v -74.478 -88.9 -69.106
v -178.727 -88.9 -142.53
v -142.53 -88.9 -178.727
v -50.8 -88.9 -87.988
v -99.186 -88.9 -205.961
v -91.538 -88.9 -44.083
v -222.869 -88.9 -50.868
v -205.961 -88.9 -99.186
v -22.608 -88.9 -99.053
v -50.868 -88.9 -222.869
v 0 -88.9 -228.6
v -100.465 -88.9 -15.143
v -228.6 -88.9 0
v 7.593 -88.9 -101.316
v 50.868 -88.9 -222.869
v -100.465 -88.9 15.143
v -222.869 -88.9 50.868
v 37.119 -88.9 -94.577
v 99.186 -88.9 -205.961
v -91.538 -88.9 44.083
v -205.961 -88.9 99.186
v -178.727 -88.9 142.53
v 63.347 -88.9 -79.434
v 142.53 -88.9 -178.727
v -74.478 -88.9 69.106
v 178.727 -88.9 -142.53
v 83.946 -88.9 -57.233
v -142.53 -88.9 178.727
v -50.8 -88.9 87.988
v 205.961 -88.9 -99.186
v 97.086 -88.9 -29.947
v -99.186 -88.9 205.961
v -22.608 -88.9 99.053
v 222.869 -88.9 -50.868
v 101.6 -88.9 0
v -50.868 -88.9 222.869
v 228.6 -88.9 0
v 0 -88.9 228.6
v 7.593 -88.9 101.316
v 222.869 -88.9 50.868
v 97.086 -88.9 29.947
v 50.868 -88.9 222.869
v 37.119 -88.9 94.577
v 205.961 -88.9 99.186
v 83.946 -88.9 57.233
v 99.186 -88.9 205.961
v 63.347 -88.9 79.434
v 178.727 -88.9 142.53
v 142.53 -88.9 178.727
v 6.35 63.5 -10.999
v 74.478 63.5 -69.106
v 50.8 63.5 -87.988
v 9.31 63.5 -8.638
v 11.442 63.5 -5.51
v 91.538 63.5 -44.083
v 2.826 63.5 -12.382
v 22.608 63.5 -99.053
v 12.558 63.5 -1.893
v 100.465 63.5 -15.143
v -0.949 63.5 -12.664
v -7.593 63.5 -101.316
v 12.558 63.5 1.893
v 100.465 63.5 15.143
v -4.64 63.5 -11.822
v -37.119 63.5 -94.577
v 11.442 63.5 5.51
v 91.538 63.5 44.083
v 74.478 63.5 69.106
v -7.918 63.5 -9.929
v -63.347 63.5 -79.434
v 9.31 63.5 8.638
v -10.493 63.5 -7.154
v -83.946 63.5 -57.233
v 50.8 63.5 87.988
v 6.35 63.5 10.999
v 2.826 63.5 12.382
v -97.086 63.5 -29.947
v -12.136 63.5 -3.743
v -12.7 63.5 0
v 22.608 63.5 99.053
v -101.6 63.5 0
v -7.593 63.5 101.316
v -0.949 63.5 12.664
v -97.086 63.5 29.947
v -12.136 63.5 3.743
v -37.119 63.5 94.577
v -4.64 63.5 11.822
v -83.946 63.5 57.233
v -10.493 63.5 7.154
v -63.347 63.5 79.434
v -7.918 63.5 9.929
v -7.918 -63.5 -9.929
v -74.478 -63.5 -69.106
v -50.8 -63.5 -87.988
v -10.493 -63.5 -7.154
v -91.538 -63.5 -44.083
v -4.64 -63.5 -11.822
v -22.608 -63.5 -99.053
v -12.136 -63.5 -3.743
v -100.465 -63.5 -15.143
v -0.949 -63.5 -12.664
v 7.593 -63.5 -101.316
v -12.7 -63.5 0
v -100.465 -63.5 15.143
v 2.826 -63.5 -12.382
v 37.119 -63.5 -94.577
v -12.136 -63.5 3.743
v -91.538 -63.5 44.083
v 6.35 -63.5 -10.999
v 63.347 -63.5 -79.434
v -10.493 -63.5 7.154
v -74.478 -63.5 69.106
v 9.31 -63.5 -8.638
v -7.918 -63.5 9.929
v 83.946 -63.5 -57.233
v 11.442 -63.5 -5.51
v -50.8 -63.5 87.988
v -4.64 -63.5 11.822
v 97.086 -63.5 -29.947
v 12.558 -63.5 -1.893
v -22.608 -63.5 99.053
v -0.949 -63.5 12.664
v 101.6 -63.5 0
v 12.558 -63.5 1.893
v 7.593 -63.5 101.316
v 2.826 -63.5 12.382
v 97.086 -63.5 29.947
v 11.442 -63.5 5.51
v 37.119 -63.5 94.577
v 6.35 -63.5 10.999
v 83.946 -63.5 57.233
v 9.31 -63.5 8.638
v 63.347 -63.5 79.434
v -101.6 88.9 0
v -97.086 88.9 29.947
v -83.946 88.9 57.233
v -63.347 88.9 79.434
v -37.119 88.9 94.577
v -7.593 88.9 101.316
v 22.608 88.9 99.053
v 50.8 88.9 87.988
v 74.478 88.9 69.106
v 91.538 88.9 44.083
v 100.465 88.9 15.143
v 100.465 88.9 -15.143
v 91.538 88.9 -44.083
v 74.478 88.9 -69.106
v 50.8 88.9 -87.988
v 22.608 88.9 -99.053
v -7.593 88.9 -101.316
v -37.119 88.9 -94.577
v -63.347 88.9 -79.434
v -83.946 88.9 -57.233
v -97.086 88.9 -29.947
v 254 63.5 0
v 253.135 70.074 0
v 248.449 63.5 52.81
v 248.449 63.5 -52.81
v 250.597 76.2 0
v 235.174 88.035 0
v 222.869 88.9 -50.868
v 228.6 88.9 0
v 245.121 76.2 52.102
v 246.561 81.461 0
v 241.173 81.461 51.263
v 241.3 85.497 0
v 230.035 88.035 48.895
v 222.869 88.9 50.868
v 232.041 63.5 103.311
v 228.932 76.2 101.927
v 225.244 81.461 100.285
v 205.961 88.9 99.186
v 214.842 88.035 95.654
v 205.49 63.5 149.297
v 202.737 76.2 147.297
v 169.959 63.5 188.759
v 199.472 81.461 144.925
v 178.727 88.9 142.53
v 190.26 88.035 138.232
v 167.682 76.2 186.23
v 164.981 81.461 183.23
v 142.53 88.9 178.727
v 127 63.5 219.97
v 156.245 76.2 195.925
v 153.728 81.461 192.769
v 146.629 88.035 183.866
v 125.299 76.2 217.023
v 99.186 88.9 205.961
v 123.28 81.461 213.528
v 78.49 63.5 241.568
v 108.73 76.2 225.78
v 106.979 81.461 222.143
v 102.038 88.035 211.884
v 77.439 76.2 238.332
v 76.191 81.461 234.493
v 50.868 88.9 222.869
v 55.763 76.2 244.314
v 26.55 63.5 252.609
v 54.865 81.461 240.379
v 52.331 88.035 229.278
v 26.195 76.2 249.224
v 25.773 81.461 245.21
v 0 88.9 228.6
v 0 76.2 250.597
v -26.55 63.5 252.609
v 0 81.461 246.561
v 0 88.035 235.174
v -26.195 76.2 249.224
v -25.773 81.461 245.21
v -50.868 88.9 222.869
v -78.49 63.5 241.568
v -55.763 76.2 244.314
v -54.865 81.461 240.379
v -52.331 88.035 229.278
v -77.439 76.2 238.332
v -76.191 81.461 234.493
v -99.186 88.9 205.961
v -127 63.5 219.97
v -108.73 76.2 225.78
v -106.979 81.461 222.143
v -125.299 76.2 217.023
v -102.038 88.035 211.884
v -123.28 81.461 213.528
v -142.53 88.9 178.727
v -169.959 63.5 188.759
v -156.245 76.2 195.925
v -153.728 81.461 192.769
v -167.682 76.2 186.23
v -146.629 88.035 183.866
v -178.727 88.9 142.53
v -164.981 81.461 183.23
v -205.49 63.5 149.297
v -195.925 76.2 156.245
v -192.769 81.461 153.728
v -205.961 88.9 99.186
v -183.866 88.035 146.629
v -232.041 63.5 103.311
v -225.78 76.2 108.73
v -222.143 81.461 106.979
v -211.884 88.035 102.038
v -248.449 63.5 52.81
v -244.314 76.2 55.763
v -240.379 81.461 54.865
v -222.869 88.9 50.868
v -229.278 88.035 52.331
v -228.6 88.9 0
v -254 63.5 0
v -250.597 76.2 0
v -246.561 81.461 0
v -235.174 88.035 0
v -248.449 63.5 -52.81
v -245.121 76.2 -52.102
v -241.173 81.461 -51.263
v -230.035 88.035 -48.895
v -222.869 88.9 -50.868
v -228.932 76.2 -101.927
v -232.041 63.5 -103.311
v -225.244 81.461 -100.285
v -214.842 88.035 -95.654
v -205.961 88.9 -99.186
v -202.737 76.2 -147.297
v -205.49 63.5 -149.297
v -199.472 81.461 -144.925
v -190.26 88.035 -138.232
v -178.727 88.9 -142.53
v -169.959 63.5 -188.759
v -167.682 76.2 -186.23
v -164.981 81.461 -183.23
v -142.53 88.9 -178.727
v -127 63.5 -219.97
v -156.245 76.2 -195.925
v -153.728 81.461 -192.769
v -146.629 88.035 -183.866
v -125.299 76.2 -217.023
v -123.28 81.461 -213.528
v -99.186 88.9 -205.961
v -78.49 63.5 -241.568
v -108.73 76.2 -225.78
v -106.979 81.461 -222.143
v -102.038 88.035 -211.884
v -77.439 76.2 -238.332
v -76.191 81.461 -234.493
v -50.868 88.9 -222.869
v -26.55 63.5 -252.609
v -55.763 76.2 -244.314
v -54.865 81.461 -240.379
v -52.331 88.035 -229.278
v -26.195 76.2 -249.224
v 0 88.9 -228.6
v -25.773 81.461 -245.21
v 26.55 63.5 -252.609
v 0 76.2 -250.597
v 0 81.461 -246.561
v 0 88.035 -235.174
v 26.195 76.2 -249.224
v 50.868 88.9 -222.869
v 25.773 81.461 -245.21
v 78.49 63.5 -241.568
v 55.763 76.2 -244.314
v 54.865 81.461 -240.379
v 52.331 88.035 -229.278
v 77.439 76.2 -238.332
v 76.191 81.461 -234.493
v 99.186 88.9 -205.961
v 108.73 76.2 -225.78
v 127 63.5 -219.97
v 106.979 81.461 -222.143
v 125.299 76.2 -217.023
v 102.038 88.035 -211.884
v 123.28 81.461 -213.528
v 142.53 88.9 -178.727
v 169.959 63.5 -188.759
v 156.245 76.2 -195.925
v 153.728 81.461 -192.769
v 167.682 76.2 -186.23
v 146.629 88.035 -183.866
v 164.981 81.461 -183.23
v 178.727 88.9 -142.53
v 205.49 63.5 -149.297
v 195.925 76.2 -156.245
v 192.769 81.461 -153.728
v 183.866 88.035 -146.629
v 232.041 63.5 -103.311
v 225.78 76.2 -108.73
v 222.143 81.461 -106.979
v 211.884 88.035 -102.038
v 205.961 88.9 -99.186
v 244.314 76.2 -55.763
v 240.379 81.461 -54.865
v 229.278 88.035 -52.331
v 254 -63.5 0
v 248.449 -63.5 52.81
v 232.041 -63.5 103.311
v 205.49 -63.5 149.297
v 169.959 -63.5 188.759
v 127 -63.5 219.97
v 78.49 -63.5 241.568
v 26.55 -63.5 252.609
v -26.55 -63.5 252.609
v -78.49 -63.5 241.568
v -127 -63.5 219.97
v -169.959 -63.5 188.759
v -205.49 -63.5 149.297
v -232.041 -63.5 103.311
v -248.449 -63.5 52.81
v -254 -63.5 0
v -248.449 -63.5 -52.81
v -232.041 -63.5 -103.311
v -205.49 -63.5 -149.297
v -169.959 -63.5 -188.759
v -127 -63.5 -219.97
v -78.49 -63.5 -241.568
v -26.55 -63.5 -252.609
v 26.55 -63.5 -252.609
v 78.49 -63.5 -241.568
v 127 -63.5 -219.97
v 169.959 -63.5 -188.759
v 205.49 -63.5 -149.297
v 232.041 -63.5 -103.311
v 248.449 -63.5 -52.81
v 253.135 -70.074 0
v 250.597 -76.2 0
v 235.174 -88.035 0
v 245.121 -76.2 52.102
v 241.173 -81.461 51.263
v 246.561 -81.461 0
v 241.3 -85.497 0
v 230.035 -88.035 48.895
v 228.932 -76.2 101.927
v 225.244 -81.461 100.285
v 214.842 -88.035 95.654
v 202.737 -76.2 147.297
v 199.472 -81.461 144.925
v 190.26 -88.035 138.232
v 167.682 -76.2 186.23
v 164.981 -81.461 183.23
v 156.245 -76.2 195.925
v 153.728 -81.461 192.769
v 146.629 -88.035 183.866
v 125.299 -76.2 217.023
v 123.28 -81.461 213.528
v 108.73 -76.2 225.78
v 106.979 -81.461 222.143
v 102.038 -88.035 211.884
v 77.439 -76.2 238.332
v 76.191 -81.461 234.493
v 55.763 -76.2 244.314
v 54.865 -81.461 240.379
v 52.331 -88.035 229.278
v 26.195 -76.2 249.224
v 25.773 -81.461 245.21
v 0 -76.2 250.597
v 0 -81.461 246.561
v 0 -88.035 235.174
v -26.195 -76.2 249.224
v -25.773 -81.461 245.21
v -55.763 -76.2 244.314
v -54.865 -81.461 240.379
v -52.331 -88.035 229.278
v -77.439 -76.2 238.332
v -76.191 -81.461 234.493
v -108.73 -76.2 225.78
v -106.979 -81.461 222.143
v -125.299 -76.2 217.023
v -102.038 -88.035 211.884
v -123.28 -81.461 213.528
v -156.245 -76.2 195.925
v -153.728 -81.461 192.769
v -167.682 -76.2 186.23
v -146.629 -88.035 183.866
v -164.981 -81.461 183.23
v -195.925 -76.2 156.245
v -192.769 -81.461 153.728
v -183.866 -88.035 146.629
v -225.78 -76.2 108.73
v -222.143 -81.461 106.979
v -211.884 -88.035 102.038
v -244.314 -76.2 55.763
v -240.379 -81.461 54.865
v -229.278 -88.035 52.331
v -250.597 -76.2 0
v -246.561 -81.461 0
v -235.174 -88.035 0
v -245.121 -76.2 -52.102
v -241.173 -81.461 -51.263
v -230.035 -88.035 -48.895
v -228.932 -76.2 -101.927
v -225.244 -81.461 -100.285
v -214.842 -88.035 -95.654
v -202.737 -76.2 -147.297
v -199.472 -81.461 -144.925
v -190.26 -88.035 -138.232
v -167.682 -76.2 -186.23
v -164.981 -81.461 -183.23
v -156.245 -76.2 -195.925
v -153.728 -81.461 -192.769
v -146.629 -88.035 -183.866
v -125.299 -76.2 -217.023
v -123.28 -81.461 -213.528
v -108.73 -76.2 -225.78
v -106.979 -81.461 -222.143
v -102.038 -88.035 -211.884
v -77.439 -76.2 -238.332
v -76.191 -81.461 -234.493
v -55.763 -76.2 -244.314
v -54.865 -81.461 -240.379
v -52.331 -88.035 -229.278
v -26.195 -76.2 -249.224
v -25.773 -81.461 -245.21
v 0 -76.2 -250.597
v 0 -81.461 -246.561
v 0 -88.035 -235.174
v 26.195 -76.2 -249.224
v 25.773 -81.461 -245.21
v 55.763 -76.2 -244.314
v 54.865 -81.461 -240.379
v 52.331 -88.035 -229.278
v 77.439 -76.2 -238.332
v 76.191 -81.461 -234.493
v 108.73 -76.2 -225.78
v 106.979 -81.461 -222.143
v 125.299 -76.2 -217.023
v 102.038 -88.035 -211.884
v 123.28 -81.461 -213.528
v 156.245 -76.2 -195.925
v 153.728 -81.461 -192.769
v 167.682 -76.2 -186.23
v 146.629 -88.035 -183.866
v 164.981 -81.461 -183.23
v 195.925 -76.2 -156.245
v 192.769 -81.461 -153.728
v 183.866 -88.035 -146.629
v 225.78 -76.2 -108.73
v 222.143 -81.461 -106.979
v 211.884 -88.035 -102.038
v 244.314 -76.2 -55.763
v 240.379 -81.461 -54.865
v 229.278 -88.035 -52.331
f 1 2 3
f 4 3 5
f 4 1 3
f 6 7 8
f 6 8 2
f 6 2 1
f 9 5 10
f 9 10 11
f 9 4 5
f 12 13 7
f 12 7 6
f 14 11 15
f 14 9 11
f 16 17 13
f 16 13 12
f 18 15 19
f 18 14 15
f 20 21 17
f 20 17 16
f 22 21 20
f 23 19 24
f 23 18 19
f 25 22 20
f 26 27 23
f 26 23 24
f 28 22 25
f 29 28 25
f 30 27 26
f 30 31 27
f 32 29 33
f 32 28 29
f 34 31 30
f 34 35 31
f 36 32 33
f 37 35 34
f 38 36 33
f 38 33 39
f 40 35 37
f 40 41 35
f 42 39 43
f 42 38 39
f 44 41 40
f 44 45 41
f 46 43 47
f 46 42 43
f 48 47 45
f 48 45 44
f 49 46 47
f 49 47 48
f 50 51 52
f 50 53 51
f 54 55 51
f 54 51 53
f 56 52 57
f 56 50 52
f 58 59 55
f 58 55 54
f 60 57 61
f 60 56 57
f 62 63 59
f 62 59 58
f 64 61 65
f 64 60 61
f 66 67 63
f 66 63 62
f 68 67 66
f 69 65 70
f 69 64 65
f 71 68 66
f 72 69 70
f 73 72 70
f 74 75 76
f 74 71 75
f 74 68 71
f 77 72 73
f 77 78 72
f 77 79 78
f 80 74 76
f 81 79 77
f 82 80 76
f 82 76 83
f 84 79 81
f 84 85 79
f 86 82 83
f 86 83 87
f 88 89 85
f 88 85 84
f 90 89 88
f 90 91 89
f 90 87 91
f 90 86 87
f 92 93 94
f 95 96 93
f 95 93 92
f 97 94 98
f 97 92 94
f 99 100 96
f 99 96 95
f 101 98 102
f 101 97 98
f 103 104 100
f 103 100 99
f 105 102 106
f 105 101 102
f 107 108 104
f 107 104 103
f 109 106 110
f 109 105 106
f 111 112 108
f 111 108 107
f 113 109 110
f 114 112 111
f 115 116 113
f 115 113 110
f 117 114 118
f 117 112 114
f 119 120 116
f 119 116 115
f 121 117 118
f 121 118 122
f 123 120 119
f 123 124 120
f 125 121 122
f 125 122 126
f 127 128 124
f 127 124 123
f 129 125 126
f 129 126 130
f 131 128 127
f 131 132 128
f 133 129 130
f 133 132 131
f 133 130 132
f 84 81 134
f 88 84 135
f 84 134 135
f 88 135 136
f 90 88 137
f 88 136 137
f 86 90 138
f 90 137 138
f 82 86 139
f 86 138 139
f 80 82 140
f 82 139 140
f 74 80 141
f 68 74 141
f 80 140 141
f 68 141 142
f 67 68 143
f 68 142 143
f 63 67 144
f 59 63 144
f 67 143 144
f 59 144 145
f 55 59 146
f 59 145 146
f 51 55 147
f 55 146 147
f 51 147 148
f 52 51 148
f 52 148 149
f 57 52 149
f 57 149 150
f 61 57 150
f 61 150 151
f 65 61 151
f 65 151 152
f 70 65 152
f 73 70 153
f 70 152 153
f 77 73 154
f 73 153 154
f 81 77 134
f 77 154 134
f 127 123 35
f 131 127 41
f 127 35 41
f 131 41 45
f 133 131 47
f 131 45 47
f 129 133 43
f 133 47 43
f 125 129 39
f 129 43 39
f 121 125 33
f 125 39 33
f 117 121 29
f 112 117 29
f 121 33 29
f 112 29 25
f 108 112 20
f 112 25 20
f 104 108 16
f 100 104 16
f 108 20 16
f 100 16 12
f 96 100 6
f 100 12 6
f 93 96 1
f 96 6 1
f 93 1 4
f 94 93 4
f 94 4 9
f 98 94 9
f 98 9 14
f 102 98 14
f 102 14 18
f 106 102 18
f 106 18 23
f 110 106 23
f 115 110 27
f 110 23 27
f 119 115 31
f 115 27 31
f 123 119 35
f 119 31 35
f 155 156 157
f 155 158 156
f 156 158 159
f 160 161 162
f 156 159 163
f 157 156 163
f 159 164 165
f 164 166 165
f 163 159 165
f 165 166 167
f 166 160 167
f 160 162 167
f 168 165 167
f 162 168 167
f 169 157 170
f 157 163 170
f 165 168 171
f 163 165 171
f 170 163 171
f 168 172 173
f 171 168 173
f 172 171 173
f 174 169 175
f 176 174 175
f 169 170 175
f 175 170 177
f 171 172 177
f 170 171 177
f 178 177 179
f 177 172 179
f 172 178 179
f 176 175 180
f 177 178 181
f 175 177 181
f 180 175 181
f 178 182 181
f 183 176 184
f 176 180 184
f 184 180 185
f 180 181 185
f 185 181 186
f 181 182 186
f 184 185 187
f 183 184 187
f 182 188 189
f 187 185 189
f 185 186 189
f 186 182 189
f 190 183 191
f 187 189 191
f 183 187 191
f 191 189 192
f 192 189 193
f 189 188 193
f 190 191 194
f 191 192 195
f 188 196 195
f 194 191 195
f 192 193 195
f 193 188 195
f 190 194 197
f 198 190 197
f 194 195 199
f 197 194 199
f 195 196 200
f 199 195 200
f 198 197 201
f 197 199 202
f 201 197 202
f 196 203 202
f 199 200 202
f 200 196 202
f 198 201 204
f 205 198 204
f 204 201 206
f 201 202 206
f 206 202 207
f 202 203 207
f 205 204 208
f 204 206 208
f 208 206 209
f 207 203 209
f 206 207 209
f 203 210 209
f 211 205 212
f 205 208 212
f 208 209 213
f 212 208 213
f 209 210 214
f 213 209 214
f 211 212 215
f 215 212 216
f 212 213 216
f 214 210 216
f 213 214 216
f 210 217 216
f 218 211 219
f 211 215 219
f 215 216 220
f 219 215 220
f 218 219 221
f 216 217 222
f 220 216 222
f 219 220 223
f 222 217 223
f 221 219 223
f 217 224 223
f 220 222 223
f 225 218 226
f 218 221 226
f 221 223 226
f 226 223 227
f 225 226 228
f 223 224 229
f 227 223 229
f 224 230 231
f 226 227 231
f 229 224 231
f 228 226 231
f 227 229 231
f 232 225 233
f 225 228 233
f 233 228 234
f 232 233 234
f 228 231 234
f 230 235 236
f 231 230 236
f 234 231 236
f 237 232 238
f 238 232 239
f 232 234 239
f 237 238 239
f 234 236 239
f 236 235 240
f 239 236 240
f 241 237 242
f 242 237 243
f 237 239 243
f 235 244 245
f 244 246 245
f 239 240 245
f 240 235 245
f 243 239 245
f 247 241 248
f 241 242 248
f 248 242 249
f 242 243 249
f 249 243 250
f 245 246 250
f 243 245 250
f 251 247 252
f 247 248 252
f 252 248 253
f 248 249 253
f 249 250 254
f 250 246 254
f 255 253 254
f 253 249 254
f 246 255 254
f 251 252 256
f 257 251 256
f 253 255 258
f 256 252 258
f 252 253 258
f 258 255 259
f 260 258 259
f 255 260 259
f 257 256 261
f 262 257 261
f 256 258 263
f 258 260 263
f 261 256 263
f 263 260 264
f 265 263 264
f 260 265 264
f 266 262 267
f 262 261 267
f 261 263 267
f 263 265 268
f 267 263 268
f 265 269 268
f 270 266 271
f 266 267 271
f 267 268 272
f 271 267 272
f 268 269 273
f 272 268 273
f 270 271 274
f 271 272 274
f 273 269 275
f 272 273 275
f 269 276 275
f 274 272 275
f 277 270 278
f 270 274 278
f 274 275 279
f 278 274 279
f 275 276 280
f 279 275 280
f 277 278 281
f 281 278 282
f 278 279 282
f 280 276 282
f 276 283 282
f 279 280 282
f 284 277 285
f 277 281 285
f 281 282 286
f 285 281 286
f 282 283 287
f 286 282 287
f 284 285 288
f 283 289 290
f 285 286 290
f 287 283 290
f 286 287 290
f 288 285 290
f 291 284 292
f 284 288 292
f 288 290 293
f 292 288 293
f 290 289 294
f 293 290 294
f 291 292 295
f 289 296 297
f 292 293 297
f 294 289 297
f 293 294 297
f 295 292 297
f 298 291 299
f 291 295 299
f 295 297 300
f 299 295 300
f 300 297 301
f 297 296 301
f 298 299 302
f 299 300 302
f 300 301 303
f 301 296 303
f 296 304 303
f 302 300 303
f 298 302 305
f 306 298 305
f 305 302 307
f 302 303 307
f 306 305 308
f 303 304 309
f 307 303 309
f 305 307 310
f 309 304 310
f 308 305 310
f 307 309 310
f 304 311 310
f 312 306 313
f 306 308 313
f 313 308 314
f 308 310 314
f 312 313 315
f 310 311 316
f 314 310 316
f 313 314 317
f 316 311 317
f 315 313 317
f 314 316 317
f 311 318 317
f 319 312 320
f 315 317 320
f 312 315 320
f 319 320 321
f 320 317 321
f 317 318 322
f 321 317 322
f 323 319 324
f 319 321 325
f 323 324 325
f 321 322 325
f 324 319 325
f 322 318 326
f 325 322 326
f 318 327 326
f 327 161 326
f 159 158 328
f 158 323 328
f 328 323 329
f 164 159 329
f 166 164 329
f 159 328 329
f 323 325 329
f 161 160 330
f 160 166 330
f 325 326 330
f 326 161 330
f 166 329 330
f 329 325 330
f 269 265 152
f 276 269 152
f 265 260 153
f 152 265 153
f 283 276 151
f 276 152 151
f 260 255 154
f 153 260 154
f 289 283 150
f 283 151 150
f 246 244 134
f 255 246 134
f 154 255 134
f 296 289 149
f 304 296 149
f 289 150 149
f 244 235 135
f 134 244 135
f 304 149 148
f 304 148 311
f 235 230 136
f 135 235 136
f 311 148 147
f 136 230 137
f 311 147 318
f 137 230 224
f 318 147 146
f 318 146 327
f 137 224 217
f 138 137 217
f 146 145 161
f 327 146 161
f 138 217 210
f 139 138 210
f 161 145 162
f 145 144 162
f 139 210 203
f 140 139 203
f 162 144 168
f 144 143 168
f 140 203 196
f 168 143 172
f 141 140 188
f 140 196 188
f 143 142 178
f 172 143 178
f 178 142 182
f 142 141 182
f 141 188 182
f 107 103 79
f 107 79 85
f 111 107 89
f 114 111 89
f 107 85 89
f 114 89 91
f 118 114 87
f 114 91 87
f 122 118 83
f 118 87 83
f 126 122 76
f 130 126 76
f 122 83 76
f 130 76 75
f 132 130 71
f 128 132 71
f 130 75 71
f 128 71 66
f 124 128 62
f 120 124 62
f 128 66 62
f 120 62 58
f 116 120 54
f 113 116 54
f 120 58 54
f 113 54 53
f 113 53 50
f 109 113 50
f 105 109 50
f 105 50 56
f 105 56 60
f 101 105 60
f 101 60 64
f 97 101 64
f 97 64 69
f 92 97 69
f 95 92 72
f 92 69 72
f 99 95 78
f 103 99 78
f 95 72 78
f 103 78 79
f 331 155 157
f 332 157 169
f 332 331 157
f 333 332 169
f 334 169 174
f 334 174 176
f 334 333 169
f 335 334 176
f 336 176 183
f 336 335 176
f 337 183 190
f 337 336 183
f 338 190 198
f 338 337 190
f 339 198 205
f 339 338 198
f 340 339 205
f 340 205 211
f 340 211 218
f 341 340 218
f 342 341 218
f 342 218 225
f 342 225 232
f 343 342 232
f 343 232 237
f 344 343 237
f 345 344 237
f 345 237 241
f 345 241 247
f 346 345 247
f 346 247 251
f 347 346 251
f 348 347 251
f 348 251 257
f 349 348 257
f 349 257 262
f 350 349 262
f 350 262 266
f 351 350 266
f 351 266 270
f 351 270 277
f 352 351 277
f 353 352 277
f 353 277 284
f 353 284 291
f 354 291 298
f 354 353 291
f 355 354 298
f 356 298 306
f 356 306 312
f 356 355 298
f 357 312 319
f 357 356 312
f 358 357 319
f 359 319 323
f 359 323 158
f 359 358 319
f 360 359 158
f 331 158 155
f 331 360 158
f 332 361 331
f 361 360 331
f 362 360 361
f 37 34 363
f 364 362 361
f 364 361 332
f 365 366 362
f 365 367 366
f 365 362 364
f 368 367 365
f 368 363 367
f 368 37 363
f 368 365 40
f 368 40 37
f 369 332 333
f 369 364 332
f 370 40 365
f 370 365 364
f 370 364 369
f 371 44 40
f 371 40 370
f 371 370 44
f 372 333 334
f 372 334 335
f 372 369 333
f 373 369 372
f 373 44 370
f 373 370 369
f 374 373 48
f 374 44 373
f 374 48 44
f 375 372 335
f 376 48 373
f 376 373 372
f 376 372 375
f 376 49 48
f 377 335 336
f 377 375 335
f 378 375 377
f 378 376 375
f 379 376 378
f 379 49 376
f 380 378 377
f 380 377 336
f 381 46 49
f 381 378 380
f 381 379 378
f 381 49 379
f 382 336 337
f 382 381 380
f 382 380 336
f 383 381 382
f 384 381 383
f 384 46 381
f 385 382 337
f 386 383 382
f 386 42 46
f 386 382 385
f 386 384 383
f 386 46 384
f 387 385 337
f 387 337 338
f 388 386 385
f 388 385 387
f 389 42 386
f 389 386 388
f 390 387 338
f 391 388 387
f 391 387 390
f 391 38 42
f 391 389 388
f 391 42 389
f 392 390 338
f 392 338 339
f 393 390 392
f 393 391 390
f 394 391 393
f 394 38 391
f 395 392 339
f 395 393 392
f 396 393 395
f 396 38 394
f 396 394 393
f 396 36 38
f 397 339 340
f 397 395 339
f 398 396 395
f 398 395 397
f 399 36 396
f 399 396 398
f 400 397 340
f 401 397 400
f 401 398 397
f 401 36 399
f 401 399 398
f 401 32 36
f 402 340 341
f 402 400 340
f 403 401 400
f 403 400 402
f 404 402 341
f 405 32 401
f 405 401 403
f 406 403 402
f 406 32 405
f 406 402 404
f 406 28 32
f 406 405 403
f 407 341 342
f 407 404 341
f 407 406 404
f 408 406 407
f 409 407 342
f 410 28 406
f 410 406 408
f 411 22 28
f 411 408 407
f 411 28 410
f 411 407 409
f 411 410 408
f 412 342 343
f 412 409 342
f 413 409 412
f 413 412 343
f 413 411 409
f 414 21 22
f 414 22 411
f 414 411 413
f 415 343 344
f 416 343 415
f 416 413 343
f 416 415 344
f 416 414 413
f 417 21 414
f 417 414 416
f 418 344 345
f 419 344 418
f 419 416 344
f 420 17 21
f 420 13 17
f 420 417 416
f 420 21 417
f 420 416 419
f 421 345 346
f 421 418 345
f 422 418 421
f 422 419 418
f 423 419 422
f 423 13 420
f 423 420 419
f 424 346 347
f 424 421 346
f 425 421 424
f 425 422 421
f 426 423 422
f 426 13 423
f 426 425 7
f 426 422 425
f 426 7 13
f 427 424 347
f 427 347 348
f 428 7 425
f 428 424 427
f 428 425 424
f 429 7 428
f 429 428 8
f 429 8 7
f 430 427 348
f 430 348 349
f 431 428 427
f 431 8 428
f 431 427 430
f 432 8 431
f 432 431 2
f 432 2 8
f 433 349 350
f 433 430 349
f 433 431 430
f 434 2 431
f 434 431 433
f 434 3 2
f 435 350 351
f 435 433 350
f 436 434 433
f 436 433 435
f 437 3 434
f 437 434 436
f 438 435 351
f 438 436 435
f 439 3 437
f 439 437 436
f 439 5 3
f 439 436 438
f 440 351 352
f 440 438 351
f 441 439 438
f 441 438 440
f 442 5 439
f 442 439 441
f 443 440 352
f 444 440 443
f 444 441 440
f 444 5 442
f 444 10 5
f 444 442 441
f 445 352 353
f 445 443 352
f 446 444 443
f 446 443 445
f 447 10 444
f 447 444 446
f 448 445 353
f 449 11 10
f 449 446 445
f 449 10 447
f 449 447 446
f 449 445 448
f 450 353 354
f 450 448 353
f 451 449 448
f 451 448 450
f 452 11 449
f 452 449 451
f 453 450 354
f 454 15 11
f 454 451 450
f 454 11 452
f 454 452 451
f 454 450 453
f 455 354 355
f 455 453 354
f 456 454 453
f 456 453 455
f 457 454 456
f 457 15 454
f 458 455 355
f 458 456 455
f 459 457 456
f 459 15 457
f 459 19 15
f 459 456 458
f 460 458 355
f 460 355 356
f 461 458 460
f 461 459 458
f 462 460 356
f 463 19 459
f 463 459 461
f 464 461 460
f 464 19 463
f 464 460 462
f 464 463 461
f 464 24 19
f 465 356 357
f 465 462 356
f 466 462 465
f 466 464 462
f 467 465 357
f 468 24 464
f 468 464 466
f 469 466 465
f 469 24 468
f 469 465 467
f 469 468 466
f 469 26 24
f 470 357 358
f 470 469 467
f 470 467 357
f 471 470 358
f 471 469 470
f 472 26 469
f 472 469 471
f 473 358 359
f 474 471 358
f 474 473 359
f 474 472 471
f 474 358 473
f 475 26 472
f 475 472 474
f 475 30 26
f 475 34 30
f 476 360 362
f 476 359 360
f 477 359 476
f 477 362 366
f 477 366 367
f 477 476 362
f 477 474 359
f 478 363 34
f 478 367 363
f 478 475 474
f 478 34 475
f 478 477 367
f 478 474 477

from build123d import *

# Parameters (mm, degrees)
F0_R     = 254
F1_DEPTH = 88.9
F2_R     = 101.6
F3_DEPTH = 25.4
F4_R     = 101.6
F5_DEPTH = 25.4
F6_R     = 12.7
F7_DEPTH = 127
F8_R     = 12.7
F9_DEPTH = 177.8
F10_R    = 25.4


with BuildPart() as f1:
    # F0 (on Front) → F1 (new body, symmetric)
    with BuildSketch(Plane.XZ):
        Circle(F0_R)
    extrude(amount=F1_DEPTH, both=True)

    # F2 (on face) → F3 (cut)
    with BuildSketch(Plane(origin=(0, 88.9, 0), x_dir=(-1, 0, 0), z_dir=(0, 1, 0))):
        Circle(F2_R)
    extrude(amount=-F3_DEPTH, mode=Mode.SUBTRACT)

    # F4 (on face) → F5 (cut)
    with BuildSketch(Plane.XZ.offset(88.9)):
        Circle(F4_R)
    extrude(amount=-F5_DEPTH, mode=Mode.SUBTRACT)

    # F6 (on face) → F7 (cut)
    with BuildSketch(Plane(origin=(0, 63.5, 0), x_dir=(-1, 0, 0), z_dir=(0, 1, 0))):
        Circle(F6_R)
    extrude(amount=-F7_DEPTH, mode=Mode.SUBTRACT)

    # F8 (on face) → F9 (cut, symmetric)
    with BuildSketch(Plane(origin=(0, 88.9, 0), x_dir=(-1, 0, 0), z_dir=(0, 1, 0))):
        Circle(F8_R)
    extrude(amount=F9_DEPTH, both=True, mode=Mode.SUBTRACT)

    # F10
    f10_edges = [f1.edges().sort_by_distance(p)[0] for p in [
        (-254, -88.9, 0),
        (-254, 88.9, 0),
    ]]
    fillet(f10_edges, radius=F10_R)


solid = f1.part
